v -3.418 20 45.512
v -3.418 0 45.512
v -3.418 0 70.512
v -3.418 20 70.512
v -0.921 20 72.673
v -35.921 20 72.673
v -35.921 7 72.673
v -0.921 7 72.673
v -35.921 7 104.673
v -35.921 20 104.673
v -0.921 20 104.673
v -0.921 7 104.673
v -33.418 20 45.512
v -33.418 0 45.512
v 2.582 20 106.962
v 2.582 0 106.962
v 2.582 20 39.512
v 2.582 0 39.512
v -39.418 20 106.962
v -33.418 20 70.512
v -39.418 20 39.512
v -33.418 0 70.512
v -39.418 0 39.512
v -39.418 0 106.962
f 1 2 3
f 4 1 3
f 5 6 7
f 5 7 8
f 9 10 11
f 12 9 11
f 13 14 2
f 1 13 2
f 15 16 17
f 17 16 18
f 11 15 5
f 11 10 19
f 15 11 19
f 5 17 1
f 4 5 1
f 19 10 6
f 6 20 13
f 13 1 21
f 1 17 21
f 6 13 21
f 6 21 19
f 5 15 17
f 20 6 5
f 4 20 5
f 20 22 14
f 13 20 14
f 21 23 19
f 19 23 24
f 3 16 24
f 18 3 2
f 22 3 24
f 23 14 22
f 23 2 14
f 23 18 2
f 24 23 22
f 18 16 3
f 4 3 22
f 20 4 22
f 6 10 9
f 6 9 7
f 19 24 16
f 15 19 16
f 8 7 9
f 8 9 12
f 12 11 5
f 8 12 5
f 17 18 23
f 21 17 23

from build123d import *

# Parameters (mm, degrees)
SKETCH1_W           = 12.05
SKETCH1_H           = 22.45
BOSS_EXTRUDE2_DEPTH = 20
SKETCH6_W           = 35.864128229
SKETCH6_H           = 30.191250037
BOSS_EXTRUDE3_DEPTH = 20
SKETCH7_W           = 35
SKETCH7_H           = 32
CUT_EXTRUDE3_DEPTH  = 13


with BuildPart() as part:
    # Sketch1 → Boss-Extrude2 (new body)
    with BuildSketch(Plane(origin=(0, 0, 0), x_dir=(1, 0, 0), z_dir=(0, 1, 0))):
        Polygon((-39.417705009, -78.511923184), (-39.417705009, -39.511923184), (-18.417705009, -39.511923184), (2.582294991, -39.511923184), (2.582294991, -78.511923184), (2.582294991, -106.961923184), (-18.417705009, -106.961923184), (-39.417705009, -106.961923184), align=None)
        with Locations((-27.392705009, -89.736923184)):
            Rectangle(SKETCH1_W, SKETCH1_H, mode=Mode.SUBTRACT)
        Polygon((-33.417705009, -70.511923184), (-33.417705009, -45.511923184), (-18.417705009, -45.511923184), (-3.417705009, -45.511923184), (-3.417705009, -70.511923184), align=None, mode=Mode.SUBTRACT)
        with Locations((-9.442705009, -89.736923184)):
            Rectangle(SKETCH1_W, SKETCH1_H, mode=Mode.SUBTRACT)
    extrude(amount=BOSS_EXTRUDE2_DEPTH)

    # Sketch6 → Boss-Extrude3 (add)
    with BuildSketch(Plane(origin=(0, 20, 0), x_dir=(1, 0, 0), z_dir=(0, 1, 0))):
        with Locations((-18.754231682, -88.861375831)):
            Rectangle(SKETCH6_W, SKETCH6_H)
    extrude(amount=-BOSS_EXTRUDE3_DEPTH)

    # Sketch7 → Cut-Extrude3 (cut)
    with BuildSketch(Plane(origin=(0, 20, 0), x_dir=(1, 0, 0), z_dir=(0, 1, 0))):
        with Locations((-18.421350721, -88.672765983)):
            Rectangle(SKETCH7_W, SKETCH7_H)
    extrude(amount=-CUT_EXTRUDE3_DEPTH, mode=Mode.SUBTRACT)


solid = part.part
